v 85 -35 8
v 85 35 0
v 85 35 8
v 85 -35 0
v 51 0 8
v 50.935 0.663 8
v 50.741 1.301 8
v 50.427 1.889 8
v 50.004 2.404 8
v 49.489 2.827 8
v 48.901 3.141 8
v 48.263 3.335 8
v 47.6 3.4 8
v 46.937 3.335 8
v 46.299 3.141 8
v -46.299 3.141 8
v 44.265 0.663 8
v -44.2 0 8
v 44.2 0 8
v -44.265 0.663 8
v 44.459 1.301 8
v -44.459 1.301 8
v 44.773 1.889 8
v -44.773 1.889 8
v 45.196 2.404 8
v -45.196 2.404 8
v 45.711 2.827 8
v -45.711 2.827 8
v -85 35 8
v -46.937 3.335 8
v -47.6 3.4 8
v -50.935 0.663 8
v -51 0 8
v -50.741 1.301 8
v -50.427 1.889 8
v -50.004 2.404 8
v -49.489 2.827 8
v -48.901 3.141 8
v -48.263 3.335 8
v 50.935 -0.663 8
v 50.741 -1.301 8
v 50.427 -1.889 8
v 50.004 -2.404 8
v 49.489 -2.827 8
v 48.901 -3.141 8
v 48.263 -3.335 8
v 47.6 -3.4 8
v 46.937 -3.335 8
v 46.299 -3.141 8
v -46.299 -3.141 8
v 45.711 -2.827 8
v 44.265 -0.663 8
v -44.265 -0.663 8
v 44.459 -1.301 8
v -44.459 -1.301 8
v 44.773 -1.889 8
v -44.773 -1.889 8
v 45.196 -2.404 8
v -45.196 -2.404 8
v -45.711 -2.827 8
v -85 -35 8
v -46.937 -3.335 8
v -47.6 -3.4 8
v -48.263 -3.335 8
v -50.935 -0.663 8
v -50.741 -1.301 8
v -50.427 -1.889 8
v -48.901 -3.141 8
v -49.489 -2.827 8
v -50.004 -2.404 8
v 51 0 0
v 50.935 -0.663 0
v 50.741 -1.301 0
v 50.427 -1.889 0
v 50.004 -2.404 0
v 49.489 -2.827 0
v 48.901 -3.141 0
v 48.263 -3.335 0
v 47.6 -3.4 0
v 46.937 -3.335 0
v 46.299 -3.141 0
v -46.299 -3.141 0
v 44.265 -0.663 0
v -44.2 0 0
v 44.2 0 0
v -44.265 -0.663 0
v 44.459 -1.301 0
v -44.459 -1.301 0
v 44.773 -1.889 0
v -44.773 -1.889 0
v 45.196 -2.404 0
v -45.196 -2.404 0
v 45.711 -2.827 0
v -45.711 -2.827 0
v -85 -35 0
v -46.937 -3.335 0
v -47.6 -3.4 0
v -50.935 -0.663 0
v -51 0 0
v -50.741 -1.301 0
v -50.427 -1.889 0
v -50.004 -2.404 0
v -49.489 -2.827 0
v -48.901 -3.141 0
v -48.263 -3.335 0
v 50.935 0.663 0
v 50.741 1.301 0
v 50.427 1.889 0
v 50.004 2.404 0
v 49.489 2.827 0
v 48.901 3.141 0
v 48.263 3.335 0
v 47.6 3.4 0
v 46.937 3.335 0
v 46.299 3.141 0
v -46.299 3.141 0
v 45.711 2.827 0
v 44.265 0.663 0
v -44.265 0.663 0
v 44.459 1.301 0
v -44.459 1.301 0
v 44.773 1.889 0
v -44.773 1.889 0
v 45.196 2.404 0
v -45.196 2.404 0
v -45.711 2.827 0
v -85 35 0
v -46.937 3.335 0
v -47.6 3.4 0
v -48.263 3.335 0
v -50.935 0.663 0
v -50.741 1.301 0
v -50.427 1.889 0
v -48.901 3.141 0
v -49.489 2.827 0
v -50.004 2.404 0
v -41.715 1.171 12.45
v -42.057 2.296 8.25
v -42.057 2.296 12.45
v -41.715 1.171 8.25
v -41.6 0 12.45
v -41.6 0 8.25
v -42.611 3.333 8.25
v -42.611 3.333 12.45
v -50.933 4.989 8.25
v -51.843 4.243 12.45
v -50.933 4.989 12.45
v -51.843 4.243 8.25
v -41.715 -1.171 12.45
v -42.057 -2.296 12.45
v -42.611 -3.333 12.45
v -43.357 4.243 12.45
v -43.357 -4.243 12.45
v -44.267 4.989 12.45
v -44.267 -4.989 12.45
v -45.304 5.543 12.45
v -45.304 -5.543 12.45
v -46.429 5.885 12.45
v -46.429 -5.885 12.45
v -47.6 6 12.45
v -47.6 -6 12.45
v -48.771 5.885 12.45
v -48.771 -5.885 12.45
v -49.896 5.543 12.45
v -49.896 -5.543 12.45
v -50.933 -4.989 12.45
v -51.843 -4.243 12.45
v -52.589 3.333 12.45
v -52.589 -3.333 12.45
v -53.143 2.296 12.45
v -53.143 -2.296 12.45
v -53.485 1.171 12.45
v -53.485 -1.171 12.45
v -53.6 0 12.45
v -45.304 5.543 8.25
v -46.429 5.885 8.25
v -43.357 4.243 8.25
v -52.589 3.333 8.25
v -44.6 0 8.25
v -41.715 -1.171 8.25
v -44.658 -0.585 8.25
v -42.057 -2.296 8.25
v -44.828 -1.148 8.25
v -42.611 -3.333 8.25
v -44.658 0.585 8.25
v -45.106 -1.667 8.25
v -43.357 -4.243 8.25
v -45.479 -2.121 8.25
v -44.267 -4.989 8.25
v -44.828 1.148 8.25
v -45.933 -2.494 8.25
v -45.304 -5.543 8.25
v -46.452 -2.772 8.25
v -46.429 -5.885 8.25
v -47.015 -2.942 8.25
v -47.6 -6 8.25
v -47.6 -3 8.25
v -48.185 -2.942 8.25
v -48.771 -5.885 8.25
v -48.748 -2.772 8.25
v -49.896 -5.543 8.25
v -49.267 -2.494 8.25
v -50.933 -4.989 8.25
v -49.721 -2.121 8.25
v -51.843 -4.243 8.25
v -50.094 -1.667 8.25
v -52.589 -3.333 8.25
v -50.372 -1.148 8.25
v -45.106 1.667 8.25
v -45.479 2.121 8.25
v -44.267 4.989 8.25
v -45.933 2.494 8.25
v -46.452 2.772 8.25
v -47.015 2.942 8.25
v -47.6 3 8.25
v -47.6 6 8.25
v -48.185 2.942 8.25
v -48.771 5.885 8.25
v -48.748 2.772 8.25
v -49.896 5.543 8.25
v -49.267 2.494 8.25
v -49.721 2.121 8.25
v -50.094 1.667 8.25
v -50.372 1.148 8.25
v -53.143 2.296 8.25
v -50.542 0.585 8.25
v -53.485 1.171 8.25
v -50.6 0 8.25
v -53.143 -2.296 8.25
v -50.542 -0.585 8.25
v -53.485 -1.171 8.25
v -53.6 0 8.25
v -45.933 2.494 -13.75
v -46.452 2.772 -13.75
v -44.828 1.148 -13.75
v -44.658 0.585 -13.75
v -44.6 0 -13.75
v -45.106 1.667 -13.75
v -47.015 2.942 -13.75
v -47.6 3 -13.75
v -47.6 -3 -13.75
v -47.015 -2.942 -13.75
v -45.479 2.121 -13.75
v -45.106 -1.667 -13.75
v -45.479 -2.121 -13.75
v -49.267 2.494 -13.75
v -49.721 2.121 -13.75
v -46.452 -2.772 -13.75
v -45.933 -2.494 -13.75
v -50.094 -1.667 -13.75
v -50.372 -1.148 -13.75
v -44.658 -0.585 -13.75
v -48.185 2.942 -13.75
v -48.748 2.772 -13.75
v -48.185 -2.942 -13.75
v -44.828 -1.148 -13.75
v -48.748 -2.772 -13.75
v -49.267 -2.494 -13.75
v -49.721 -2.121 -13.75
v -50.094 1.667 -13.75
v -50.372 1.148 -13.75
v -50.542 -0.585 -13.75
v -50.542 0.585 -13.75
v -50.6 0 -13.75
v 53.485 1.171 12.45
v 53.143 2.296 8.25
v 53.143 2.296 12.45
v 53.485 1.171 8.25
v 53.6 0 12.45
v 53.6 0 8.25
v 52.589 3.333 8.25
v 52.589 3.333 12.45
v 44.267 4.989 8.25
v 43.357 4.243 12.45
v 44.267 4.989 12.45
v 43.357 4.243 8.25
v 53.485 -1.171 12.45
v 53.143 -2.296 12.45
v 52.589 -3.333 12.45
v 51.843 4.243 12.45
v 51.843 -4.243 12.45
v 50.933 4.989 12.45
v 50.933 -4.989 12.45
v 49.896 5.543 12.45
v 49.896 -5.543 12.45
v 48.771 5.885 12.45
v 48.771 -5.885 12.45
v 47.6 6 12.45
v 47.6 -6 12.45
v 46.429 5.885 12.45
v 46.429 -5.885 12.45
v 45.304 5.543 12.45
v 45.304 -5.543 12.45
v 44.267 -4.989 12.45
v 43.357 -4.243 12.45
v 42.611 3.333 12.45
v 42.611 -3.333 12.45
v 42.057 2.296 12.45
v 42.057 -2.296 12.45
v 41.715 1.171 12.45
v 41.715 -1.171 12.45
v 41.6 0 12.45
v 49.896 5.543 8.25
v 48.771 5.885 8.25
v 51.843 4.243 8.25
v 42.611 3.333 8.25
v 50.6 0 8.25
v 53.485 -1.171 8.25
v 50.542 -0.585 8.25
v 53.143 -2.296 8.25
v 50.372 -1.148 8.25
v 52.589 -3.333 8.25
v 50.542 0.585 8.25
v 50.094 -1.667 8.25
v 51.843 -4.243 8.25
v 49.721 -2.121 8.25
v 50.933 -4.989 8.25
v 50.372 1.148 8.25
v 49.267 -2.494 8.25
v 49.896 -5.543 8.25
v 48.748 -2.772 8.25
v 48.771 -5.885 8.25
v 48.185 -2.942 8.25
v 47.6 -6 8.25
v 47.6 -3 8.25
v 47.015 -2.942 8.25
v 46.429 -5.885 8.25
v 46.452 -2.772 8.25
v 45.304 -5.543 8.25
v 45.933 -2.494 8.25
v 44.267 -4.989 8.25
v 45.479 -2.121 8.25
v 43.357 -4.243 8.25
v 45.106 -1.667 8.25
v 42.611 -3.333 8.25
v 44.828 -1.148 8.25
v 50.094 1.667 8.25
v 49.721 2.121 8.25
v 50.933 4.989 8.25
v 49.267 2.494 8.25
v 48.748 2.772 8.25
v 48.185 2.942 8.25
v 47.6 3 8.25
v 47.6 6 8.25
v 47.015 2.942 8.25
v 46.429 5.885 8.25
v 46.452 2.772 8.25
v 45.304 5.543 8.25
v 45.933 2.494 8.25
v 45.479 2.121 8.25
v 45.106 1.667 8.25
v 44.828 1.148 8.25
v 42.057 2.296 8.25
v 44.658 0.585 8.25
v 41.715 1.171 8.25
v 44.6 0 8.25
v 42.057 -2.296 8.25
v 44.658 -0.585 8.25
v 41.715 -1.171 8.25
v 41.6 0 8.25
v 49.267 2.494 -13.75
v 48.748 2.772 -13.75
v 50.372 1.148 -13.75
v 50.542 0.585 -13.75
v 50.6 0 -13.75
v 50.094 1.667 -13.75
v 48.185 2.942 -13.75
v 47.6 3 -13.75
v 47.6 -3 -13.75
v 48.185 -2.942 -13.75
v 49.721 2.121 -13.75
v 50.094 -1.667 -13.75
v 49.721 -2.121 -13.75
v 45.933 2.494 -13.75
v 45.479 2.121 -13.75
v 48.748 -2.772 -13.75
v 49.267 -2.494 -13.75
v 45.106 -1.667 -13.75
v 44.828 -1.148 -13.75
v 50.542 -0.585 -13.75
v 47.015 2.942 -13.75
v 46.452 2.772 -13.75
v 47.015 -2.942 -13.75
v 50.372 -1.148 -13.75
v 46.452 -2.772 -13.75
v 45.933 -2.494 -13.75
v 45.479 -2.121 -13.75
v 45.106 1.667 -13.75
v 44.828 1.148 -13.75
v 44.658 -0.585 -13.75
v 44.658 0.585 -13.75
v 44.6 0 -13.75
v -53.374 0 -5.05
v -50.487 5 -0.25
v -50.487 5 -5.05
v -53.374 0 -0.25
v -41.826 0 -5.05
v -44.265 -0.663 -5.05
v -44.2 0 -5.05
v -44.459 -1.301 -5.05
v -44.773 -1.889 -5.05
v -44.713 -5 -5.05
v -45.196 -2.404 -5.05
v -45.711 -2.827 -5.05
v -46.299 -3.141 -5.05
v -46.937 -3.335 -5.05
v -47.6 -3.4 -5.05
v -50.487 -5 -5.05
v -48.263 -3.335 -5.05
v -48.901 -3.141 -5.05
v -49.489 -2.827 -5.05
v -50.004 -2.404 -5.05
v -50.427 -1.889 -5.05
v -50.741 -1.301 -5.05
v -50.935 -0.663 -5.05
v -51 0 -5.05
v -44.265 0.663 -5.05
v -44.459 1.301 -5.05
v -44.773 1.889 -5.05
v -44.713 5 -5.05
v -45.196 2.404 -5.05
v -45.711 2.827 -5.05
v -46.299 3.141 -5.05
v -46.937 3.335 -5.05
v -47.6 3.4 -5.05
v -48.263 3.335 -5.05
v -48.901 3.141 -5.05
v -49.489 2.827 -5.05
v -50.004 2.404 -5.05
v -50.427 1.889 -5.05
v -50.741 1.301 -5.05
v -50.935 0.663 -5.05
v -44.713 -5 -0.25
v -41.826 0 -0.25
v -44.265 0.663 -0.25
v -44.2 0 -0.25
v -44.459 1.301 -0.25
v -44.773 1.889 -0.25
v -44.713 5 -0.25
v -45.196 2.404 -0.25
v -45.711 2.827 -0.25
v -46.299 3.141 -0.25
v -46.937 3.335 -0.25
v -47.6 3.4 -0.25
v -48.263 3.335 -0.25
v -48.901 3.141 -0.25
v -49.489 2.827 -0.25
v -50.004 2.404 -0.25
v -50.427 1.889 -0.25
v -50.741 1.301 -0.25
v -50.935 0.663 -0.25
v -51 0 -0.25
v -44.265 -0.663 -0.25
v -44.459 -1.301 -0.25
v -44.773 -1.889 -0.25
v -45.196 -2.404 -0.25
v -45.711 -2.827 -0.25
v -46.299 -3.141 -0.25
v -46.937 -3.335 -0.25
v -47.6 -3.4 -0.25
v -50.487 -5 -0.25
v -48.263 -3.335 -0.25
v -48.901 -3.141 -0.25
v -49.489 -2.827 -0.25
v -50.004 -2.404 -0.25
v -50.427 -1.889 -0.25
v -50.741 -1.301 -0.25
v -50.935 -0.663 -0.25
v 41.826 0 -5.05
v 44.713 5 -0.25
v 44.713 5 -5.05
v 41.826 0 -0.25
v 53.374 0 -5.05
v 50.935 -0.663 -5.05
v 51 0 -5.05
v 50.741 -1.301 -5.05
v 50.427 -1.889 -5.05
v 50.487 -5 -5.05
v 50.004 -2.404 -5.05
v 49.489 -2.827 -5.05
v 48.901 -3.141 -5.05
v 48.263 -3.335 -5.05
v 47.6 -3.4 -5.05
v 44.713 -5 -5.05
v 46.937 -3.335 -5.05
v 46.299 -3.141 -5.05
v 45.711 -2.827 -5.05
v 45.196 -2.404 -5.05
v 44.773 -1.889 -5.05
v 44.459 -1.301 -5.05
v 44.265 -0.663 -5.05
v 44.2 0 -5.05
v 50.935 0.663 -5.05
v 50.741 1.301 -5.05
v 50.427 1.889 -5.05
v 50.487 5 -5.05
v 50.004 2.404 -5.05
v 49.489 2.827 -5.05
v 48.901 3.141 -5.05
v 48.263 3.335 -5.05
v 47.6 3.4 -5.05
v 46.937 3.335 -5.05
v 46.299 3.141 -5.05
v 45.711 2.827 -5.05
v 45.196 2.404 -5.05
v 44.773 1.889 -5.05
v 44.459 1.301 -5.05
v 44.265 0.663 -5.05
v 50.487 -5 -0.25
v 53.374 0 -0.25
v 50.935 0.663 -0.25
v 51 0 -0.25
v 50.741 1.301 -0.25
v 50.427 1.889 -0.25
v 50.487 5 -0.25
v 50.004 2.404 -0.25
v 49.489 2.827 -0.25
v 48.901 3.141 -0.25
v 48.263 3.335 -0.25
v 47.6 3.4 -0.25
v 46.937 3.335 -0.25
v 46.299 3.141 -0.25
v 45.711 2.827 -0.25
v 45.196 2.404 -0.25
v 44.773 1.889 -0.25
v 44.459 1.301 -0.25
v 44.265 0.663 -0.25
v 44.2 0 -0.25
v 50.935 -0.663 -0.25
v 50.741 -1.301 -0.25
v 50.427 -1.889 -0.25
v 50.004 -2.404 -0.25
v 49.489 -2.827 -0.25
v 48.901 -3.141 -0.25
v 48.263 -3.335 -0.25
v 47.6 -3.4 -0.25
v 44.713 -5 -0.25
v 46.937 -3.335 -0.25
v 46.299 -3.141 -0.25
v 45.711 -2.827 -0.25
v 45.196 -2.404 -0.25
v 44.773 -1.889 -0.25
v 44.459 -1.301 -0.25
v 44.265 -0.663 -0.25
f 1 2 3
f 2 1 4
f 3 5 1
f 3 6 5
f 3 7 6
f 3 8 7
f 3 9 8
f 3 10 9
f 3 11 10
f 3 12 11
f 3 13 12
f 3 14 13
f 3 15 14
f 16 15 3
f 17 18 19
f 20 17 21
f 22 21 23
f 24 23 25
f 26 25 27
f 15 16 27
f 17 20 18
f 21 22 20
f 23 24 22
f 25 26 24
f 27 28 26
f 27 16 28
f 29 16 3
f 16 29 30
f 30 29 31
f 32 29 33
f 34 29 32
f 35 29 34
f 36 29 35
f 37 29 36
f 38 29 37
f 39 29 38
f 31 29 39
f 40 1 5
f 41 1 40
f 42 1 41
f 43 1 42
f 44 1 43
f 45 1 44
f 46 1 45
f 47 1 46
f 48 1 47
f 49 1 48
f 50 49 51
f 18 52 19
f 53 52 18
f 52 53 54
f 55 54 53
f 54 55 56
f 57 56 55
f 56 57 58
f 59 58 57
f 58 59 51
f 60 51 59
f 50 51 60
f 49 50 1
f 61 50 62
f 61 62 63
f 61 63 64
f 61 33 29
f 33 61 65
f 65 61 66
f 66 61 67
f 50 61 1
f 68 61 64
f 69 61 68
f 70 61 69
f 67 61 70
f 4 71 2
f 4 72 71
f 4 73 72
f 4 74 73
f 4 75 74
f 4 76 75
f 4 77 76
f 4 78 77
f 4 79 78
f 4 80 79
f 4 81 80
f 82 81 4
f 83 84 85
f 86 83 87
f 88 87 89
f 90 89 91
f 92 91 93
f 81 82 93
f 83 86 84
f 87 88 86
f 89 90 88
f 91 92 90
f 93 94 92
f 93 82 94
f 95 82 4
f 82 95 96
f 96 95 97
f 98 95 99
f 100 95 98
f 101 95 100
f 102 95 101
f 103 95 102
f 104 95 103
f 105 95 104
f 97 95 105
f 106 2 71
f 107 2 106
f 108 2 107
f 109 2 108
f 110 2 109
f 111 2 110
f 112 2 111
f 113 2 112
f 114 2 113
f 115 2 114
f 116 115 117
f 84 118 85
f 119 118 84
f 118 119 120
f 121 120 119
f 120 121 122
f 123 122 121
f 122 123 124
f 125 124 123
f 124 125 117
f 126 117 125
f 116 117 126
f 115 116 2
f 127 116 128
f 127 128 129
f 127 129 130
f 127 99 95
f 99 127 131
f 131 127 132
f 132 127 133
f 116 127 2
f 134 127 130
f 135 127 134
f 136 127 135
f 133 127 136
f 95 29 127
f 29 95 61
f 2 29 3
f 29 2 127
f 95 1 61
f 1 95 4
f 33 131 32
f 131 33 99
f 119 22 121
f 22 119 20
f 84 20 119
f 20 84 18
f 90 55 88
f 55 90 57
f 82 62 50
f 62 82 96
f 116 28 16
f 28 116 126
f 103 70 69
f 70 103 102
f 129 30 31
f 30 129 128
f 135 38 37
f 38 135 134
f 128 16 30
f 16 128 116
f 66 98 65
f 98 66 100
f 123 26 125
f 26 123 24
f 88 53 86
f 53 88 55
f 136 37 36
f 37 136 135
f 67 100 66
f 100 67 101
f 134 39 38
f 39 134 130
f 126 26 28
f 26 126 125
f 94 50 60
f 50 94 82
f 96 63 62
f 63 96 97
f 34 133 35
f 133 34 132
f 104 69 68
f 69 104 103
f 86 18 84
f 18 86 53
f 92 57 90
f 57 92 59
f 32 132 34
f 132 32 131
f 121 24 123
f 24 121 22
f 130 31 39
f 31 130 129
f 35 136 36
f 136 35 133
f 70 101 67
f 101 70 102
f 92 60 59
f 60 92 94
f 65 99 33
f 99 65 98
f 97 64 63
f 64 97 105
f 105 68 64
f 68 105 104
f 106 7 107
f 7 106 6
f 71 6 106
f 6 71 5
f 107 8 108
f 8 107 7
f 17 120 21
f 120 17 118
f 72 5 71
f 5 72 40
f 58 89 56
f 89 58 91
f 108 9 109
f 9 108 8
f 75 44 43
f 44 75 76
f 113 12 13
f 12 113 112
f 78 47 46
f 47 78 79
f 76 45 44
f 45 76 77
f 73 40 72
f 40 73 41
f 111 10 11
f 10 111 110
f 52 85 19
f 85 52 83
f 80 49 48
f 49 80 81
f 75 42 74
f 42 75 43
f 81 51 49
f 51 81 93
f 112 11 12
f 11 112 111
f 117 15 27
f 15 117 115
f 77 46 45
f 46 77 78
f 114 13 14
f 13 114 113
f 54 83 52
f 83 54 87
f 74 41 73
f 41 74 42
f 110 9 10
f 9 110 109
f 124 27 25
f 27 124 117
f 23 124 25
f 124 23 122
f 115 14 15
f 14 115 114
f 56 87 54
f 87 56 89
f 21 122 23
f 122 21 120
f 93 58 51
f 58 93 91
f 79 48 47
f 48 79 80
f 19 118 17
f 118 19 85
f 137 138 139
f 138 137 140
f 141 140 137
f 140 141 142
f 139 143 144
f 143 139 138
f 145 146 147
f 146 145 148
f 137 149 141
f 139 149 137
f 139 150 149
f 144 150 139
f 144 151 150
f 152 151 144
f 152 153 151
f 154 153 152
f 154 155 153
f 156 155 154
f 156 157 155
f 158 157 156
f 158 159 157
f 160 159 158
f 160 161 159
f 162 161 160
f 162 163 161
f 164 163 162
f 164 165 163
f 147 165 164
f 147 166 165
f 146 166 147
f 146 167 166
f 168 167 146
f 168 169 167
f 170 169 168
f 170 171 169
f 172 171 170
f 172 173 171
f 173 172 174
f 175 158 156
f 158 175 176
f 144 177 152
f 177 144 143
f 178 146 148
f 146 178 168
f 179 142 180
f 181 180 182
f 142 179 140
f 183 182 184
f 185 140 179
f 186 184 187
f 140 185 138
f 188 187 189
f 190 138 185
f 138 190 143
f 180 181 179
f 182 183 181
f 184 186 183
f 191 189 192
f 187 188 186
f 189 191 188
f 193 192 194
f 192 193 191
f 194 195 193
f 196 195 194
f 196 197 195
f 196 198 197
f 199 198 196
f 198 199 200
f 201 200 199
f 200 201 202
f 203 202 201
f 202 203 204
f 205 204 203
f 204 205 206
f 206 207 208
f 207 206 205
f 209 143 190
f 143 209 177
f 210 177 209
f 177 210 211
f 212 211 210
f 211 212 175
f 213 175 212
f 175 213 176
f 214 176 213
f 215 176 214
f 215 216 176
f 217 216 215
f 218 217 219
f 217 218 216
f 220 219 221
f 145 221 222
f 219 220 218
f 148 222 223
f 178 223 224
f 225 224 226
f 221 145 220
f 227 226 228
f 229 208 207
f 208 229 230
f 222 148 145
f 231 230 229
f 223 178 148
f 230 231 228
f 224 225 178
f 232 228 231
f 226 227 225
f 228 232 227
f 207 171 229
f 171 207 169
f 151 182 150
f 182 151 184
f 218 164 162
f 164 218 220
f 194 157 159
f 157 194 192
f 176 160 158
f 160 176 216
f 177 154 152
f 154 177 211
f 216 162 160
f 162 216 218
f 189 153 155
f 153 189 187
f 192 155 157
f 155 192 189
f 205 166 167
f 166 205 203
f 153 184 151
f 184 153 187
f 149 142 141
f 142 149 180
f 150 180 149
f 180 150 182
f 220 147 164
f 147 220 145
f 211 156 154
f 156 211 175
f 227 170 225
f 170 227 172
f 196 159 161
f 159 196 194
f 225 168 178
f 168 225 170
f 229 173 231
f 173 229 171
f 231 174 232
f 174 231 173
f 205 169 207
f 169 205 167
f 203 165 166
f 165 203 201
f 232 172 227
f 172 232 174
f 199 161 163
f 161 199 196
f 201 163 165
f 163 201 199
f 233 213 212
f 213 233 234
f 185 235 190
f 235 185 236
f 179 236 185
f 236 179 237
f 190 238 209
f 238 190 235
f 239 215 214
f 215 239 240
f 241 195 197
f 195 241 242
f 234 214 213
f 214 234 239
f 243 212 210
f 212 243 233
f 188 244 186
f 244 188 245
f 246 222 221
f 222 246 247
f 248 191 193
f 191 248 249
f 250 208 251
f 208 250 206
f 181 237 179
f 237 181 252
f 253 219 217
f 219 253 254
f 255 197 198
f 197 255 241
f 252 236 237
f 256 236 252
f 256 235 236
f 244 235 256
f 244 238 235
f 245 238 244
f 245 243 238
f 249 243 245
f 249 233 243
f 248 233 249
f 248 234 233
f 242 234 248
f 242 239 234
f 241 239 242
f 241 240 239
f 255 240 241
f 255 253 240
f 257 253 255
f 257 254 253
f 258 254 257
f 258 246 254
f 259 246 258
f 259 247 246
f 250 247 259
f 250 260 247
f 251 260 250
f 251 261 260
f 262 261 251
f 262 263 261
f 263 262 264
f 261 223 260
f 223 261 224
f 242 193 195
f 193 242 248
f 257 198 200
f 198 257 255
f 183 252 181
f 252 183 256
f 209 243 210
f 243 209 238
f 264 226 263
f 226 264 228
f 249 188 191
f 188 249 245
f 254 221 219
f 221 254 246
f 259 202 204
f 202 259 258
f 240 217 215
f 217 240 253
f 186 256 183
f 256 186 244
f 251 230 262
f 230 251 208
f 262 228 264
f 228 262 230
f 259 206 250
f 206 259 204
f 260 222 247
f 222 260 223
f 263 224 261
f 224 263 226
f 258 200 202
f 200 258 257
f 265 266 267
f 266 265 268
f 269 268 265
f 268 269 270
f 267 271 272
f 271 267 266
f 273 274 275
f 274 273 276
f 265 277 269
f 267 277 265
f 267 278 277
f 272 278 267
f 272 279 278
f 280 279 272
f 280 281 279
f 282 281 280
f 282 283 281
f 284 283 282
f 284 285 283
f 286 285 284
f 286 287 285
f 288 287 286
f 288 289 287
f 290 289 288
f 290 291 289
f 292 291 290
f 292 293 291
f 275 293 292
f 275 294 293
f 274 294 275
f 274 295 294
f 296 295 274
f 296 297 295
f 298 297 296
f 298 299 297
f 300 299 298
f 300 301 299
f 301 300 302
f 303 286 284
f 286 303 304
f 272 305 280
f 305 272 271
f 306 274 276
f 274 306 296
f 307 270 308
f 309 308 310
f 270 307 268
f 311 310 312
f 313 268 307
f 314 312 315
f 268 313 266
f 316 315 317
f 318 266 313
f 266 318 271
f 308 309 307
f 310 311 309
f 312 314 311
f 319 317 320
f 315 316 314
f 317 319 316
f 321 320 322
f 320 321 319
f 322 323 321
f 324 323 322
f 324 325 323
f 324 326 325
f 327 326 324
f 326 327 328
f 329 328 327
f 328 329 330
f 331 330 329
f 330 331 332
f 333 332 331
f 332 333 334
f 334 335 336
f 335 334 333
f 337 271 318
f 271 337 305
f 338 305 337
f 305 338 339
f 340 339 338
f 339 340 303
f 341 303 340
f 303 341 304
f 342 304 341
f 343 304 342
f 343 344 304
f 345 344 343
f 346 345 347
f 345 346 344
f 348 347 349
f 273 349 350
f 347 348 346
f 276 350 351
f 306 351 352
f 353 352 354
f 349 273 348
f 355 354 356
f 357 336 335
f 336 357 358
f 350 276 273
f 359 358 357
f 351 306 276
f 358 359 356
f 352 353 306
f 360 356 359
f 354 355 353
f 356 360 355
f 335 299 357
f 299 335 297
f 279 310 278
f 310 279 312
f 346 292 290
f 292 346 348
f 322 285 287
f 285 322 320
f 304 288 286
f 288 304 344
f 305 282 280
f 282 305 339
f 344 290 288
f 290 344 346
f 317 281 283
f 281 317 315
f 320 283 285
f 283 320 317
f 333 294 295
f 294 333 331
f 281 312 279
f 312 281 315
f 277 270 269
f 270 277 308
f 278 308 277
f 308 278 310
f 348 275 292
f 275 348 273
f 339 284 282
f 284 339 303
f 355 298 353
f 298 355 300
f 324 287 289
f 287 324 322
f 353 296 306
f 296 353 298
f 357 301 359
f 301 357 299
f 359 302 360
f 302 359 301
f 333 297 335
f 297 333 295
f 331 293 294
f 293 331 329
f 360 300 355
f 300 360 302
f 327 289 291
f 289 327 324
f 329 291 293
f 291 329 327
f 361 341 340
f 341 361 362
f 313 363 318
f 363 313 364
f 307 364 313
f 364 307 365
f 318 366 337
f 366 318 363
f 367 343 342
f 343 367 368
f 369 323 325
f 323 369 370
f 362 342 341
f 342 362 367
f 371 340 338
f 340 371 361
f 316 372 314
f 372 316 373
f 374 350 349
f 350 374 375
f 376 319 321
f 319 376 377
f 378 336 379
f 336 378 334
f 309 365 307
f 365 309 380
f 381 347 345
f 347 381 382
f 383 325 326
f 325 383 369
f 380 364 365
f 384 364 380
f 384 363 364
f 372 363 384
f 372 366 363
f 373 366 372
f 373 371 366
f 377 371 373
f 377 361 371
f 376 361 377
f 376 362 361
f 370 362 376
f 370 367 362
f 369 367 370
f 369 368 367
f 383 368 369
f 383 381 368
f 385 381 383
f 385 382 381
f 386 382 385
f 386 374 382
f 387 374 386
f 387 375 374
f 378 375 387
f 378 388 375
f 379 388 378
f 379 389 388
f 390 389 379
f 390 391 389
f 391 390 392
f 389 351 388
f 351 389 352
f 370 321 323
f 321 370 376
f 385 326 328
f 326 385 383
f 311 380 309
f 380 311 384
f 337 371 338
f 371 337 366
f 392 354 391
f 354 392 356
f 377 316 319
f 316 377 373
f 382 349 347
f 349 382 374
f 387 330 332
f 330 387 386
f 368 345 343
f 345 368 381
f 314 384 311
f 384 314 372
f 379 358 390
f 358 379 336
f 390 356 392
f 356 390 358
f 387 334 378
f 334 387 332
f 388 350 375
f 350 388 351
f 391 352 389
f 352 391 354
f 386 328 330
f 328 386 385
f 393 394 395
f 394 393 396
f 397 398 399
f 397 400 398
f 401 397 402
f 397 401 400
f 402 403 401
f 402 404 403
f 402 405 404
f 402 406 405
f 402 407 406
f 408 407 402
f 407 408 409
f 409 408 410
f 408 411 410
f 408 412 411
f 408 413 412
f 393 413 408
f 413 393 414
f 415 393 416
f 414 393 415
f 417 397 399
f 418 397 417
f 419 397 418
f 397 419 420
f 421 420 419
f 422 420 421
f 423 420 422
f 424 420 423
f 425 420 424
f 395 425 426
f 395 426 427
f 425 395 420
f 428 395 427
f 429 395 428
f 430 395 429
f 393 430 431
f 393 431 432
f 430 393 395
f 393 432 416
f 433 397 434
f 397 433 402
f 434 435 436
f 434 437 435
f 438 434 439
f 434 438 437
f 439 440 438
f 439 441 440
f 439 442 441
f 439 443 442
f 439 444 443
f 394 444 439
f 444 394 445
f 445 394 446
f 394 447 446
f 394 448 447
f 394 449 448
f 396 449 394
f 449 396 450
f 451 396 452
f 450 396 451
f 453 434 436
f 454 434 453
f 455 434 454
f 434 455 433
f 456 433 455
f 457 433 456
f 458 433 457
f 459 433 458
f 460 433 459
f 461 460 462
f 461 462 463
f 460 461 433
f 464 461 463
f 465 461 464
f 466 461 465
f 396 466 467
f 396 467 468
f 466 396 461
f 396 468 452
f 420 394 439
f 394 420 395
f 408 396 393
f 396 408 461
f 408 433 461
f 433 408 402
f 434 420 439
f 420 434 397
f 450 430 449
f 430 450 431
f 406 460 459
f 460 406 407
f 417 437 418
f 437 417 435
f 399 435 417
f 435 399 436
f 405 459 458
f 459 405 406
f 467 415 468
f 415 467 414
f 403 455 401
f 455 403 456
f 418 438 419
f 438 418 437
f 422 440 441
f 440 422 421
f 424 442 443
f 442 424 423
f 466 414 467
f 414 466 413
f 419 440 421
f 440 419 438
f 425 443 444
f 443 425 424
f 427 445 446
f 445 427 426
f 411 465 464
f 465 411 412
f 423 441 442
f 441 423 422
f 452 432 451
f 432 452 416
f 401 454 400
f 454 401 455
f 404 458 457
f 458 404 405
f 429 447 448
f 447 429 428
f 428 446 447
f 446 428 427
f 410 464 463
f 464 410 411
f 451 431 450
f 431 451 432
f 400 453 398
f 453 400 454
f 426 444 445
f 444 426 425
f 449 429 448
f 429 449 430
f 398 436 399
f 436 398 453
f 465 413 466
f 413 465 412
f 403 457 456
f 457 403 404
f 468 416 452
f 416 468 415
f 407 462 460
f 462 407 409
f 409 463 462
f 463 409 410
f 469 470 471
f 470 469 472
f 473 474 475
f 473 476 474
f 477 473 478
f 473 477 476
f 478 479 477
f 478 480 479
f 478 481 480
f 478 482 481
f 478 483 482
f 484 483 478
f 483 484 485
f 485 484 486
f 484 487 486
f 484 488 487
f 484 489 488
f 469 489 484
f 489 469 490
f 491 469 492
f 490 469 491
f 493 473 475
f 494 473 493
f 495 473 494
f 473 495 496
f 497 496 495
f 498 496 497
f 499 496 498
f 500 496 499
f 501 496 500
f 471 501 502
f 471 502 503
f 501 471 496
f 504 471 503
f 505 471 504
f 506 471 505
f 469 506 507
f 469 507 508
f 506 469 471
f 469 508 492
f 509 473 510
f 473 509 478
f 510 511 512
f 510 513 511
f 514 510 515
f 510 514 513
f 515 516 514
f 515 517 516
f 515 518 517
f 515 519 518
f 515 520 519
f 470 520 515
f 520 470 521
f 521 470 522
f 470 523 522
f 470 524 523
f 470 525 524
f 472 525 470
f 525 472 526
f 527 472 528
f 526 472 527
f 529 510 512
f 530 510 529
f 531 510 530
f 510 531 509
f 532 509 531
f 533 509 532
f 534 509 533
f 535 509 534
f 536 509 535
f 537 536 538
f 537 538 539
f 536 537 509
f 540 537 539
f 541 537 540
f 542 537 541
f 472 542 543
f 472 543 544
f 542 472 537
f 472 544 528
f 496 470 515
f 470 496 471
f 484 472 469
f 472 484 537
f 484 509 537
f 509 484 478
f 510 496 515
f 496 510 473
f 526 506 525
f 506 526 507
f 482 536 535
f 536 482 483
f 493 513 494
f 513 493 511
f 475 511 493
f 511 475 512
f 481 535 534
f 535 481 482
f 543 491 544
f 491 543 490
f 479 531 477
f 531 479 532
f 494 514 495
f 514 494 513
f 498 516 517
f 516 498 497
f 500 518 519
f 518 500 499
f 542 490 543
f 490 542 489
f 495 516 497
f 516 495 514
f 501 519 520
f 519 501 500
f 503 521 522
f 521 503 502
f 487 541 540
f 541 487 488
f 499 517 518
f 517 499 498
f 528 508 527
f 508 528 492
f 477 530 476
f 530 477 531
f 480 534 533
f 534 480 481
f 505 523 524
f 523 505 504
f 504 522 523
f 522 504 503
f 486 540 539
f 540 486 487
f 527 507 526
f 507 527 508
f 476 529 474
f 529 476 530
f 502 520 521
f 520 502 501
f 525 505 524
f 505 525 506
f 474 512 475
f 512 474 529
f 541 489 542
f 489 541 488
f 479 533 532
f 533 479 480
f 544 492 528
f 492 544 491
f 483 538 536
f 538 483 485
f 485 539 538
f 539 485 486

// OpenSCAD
$fn = 32;

// ------------------------------------------------------------------------
// Bolted plate: 170 x 70 x 8 mm plate, 2 fasteners
// Every part is its own module, assembly() places them once.
// ------------------------------------------------------------------------

// --- part 1 ---
module plate() {
  difference() {
    translate([-85, -35, 0]) cube([170, 70, 8]);
    translate([-47.6, 0, -1]) cylinder(h = 10, d = 6.8);
    translate([47.6, 0, -1]) cylinder(h = 10, d = 6.8);
  }
}

// --- part 2 ---
module bolt1() {
  cylinder(h = 4.2, d = 12);
  translate([0, 0, -22]) cylinder(h = 22, d = 6);
}

// --- part 3 ---
module bolt2() {
  cylinder(h = 4.2, d = 12);
  translate([0, 0, -22]) cylinder(h = 22, d = 6);
}

// --- part 4 ---
module nut1() {
  difference() {
    linear_extrude(height = 4.8) polygon(points = [[5.774, 0], [2.887, 5], [-2.887, 5], [-5.774, 0], [-2.887, -5], [2.887, -5]]);
    translate([0, 0, -1]) cylinder(h = 6.8, d = 6.8);
  }
}

// --- part 5 ---
module nut2() {
  difference() {
    linear_extrude(height = 4.8) polygon(points = [[5.774, 0], [2.887, 5], [-2.887, 5], [-5.774, 0], [-2.887, -5], [2.887, -5]]);
    translate([0, 0, -1]) cylinder(h = 6.8, d = 6.8);
  }
}

// --- assembly ---
module assembly() {
  translate([0, 0, 0]) rotate([0, 0, 0]) plate();
  translate([-47.6, 0, 8.25]) rotate([0, 0, 0]) bolt1();
  translate([47.6, 0, 8.25]) rotate([0, 0, 0]) bolt2();
  translate([-47.6, 0, -5.05]) rotate([0, 0, 0]) nut1();
  translate([47.6, 0, -5.05]) rotate([0, 0, 0]) nut2();
}

assembly();
